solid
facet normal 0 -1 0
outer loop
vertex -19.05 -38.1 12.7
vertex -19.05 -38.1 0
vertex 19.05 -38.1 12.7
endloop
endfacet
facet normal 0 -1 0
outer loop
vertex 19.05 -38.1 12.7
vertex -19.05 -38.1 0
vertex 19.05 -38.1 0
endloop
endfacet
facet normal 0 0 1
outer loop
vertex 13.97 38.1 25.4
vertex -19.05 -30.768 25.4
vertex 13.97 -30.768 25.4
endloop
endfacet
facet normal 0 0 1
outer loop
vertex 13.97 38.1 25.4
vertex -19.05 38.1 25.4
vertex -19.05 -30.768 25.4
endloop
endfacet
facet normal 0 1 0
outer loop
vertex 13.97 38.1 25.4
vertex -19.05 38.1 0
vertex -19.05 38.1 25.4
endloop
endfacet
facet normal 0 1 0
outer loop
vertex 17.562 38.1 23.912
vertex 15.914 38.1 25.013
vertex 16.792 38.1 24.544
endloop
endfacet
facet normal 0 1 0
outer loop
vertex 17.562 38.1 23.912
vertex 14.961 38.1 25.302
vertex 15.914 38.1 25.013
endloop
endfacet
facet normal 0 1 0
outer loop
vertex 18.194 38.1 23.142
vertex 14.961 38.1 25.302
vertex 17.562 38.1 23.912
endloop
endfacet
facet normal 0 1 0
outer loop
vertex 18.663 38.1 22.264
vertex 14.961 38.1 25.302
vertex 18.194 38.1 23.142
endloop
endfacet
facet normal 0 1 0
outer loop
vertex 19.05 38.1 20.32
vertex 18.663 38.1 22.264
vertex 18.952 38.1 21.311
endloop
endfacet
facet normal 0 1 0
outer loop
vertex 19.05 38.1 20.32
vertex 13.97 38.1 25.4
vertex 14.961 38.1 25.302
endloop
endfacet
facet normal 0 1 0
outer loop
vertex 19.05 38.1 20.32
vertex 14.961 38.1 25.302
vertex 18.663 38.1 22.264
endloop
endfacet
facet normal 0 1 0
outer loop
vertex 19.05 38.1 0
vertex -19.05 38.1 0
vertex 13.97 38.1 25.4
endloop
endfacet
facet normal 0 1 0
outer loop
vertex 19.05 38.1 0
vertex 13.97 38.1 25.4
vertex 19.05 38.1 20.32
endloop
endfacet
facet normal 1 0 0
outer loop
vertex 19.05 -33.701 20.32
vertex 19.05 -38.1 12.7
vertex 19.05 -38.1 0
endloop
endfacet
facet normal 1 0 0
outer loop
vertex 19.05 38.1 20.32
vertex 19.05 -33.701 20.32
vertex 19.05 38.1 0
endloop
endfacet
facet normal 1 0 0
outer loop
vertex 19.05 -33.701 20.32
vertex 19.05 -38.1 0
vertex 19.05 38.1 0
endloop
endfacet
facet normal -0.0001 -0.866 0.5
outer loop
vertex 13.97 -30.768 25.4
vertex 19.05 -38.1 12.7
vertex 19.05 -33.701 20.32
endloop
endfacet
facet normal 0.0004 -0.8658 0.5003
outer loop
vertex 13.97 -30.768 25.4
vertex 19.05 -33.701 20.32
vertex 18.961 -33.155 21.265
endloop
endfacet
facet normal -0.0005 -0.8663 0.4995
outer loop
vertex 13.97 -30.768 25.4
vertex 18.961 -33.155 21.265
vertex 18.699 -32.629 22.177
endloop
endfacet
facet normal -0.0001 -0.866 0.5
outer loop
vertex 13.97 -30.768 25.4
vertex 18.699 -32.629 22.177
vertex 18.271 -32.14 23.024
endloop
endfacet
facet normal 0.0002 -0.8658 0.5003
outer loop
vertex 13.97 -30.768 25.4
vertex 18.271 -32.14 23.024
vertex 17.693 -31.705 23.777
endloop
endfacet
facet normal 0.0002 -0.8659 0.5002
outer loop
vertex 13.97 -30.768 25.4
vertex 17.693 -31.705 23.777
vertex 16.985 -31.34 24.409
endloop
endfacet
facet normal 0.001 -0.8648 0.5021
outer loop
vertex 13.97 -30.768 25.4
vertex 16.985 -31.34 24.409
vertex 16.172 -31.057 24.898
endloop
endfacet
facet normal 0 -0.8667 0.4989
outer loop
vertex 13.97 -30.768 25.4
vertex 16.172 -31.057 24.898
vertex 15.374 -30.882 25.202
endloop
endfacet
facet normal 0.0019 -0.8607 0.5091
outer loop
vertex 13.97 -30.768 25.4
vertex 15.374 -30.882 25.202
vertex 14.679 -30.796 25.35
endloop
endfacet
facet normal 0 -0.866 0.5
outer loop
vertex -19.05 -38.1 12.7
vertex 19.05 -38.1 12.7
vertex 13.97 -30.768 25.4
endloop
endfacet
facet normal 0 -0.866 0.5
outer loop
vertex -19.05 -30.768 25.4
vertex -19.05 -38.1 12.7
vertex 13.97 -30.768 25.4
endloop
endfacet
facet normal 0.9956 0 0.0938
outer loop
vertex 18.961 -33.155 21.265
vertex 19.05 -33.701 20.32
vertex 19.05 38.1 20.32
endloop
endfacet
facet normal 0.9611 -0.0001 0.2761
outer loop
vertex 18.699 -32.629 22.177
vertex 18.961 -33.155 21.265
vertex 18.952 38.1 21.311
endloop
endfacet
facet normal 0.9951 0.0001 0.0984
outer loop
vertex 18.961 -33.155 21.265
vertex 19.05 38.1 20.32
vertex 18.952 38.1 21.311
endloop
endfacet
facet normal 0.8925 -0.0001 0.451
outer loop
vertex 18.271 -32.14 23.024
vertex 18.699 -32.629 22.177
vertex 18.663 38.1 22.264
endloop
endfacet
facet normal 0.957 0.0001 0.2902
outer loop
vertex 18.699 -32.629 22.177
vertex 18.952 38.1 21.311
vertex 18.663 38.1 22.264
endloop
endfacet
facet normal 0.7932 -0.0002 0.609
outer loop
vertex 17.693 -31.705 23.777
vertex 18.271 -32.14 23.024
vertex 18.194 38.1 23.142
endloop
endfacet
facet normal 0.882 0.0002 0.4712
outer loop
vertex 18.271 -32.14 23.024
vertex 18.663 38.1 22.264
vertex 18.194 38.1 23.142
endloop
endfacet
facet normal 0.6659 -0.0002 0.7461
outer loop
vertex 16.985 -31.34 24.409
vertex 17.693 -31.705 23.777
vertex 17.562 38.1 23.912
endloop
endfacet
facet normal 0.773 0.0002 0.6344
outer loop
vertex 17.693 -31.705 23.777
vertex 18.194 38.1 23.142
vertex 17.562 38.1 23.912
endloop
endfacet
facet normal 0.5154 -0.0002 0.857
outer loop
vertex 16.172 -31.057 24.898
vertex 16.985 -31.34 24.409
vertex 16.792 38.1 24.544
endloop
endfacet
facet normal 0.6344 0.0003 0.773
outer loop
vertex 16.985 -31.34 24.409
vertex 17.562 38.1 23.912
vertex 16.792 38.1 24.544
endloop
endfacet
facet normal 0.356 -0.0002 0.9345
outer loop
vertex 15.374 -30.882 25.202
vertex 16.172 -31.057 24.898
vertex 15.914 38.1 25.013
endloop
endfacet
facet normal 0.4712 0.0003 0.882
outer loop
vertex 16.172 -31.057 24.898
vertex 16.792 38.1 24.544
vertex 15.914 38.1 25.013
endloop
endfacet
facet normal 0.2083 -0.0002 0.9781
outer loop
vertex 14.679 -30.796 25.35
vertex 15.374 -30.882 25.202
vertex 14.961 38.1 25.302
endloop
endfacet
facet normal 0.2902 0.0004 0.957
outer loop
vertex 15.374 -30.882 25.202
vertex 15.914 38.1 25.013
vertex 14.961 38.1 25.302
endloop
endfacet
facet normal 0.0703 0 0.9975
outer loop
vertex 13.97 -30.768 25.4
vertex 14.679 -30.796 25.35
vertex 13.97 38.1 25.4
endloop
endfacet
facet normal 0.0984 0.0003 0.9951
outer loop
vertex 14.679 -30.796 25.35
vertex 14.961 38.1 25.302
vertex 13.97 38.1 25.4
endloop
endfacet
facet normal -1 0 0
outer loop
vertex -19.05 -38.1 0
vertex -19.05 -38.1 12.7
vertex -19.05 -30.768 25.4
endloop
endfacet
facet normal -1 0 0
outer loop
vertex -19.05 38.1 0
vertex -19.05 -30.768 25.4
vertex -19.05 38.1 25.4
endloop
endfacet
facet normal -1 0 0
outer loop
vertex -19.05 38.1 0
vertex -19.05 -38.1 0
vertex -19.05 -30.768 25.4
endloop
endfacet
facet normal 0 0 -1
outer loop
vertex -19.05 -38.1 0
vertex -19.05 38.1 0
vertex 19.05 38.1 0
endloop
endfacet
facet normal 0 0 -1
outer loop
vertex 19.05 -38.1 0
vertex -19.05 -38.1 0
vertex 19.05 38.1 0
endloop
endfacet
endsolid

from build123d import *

# Parameters (mm, degrees)
F0_W        = 38.1
F0_H        = 76.2
F1_DEPTH    = 25.4
F2_R        = 5.08
F3_T1_DEPTH = 98.731978168
F3_T6_ANGLE = 90


# Not quite as in the source:
# - a fillet or chamfer that OpenCascade refuses, or shapes differently, is made with other operations: its cross-section is extruded or revolved along the edge and cut away or added


with BuildPart() as f1:
    # F0 (on Top) → F1 (new body)
    with BuildSketch(Plane.XY):
        Rectangle(F0_W, F0_H)
    extrude(amount=F1_DEPTH)

    # F2
    f2_edges = [f1.edges().sort_by_distance(p)[0] for p in [
        (19.05, 0, 25.4),
    ]]
    fillet(f2_edges, radius=F2_R)

    # F3: chamfer of 12.7 x 7.3323484187 on 1 edges, made by hand

    # F3_s2 → F3_t1 (cut)
    with BuildSketch(Plane.YZ.offset(-51.905989084)):
        Polygon((-38.1, 12.7), (-30.7676515813, 25.4), (-38.1, 25.4), align=None)
    extrude(amount=F3_T1_DEPTH, mode=Mode.SUBTRACT)


with BuildPart() as f3_tool4:
    # F3_s5 → F3_t6 (revolve)
    with BuildSketch(Plane.XY.offset(20.32)):
        Polygon((13.97, -33.7005909488), (19.05, -30.7676515813), (19.05, -38.1), (13.97, -38.1), align=None)
    revolve(axis=Axis((13.97, -38.1, 20.32), (0, -1, 0)), revolution_arc=F3_T6_ANGLE)

    split(bisect_by=Plane(origin=(0, -34.074261314, 19.6727839421), x_dir=(1, 0, 0), z_dir=(0, -0.8660254038, 0.5)), keep=Keep.TOP)


with BuildPart() as f1_1:
    add(f1.part)

    # F3_t3: cut F3_tool4
    add(f3_tool4.part, mode=Mode.SUBTRACT)


solid = f1_1.part
